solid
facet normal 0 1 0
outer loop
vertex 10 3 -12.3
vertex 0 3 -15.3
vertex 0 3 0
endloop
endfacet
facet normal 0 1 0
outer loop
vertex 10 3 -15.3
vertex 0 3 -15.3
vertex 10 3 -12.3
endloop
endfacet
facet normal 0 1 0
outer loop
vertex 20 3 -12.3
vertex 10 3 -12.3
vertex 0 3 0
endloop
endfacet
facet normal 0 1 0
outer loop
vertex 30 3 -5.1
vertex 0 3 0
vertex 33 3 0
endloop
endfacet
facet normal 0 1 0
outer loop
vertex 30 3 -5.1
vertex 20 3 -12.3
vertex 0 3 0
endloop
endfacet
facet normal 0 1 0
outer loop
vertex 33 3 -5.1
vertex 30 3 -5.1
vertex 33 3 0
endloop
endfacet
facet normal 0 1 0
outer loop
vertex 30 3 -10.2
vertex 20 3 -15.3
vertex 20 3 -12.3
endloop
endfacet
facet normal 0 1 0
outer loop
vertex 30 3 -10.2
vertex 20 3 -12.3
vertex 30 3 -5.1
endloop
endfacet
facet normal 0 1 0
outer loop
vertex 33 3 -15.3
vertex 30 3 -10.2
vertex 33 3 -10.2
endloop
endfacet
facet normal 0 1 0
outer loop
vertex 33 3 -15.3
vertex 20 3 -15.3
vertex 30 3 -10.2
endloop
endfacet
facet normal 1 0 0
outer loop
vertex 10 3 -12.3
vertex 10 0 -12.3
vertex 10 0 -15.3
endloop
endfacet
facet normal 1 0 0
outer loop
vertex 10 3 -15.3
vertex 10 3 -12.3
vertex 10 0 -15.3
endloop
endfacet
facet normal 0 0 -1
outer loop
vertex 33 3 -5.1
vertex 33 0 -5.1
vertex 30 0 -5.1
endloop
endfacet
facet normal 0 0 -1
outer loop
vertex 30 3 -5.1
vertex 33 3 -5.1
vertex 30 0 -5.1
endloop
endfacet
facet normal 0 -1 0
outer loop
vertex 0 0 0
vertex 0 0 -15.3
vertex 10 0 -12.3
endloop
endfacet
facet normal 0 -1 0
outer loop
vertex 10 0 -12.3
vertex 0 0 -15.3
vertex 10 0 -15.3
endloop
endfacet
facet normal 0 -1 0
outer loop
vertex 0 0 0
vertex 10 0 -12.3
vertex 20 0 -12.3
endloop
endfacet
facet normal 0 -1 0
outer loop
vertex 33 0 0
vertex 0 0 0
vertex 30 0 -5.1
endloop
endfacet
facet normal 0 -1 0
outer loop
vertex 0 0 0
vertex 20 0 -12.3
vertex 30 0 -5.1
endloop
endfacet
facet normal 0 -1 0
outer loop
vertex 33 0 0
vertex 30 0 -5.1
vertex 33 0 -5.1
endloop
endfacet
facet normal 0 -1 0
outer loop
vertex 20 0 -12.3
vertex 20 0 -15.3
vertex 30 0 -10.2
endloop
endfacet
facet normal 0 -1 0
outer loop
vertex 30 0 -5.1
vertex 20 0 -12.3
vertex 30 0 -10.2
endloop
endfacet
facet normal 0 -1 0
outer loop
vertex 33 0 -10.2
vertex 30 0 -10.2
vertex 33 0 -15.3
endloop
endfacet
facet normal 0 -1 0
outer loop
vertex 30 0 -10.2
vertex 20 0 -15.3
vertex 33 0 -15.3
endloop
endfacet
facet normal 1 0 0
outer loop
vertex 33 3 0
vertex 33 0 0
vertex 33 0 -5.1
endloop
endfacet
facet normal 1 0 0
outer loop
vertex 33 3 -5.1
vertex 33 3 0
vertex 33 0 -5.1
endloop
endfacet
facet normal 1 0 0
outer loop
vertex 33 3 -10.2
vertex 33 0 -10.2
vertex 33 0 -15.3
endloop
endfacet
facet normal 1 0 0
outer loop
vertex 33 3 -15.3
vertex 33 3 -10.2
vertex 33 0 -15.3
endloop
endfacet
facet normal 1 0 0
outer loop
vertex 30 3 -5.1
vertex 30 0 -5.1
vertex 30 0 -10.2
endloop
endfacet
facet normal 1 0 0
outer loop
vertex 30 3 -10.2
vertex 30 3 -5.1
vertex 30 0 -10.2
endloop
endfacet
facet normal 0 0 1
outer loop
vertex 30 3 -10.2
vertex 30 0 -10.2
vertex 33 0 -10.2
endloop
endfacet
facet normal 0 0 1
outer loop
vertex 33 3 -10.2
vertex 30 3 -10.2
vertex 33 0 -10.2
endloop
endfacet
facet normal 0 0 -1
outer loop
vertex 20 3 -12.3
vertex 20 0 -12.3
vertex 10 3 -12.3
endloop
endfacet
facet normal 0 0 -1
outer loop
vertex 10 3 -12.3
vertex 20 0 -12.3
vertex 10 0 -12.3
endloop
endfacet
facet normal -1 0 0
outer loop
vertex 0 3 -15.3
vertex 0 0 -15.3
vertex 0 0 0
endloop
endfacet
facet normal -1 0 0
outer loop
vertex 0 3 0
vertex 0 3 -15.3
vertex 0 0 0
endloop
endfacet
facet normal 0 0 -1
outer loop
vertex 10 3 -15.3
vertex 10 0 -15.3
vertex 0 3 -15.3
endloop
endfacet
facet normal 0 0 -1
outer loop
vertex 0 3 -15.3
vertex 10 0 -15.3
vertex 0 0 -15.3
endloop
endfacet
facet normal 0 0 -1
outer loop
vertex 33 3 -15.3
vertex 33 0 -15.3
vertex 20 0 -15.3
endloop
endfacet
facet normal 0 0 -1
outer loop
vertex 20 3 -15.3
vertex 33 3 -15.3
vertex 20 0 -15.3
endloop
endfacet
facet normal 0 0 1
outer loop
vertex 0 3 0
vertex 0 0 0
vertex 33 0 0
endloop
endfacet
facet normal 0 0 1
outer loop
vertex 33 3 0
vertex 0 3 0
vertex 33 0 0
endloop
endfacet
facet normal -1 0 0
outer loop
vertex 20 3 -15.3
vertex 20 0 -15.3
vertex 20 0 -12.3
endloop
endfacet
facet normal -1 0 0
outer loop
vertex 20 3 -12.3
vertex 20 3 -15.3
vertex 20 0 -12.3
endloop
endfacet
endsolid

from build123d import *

# Parameters (mm, degrees)
BOSS_EXTRUDE1_DEPTH = 3


with BuildPart() as part:
    # Sketch1 → Boss-Extrude1 (new body)
    with BuildSketch(Plane(origin=(0, 0, 0), x_dir=(1, 0, 0), z_dir=(0, 1, 0))):
        Polygon((0, 0), (30, 0), (33, 0), (33, 5.1), (30, 5.1), (30, 10.2), (33, 10.2), (33, 15.3), (30, 15.3), (20, 15.3), (20, 12.3), (10, 12.3), (10, 15.3), (0, 15.3), align=None)
    extrude(amount=BOSS_EXTRUDE1_DEPTH)


solid = part.part
